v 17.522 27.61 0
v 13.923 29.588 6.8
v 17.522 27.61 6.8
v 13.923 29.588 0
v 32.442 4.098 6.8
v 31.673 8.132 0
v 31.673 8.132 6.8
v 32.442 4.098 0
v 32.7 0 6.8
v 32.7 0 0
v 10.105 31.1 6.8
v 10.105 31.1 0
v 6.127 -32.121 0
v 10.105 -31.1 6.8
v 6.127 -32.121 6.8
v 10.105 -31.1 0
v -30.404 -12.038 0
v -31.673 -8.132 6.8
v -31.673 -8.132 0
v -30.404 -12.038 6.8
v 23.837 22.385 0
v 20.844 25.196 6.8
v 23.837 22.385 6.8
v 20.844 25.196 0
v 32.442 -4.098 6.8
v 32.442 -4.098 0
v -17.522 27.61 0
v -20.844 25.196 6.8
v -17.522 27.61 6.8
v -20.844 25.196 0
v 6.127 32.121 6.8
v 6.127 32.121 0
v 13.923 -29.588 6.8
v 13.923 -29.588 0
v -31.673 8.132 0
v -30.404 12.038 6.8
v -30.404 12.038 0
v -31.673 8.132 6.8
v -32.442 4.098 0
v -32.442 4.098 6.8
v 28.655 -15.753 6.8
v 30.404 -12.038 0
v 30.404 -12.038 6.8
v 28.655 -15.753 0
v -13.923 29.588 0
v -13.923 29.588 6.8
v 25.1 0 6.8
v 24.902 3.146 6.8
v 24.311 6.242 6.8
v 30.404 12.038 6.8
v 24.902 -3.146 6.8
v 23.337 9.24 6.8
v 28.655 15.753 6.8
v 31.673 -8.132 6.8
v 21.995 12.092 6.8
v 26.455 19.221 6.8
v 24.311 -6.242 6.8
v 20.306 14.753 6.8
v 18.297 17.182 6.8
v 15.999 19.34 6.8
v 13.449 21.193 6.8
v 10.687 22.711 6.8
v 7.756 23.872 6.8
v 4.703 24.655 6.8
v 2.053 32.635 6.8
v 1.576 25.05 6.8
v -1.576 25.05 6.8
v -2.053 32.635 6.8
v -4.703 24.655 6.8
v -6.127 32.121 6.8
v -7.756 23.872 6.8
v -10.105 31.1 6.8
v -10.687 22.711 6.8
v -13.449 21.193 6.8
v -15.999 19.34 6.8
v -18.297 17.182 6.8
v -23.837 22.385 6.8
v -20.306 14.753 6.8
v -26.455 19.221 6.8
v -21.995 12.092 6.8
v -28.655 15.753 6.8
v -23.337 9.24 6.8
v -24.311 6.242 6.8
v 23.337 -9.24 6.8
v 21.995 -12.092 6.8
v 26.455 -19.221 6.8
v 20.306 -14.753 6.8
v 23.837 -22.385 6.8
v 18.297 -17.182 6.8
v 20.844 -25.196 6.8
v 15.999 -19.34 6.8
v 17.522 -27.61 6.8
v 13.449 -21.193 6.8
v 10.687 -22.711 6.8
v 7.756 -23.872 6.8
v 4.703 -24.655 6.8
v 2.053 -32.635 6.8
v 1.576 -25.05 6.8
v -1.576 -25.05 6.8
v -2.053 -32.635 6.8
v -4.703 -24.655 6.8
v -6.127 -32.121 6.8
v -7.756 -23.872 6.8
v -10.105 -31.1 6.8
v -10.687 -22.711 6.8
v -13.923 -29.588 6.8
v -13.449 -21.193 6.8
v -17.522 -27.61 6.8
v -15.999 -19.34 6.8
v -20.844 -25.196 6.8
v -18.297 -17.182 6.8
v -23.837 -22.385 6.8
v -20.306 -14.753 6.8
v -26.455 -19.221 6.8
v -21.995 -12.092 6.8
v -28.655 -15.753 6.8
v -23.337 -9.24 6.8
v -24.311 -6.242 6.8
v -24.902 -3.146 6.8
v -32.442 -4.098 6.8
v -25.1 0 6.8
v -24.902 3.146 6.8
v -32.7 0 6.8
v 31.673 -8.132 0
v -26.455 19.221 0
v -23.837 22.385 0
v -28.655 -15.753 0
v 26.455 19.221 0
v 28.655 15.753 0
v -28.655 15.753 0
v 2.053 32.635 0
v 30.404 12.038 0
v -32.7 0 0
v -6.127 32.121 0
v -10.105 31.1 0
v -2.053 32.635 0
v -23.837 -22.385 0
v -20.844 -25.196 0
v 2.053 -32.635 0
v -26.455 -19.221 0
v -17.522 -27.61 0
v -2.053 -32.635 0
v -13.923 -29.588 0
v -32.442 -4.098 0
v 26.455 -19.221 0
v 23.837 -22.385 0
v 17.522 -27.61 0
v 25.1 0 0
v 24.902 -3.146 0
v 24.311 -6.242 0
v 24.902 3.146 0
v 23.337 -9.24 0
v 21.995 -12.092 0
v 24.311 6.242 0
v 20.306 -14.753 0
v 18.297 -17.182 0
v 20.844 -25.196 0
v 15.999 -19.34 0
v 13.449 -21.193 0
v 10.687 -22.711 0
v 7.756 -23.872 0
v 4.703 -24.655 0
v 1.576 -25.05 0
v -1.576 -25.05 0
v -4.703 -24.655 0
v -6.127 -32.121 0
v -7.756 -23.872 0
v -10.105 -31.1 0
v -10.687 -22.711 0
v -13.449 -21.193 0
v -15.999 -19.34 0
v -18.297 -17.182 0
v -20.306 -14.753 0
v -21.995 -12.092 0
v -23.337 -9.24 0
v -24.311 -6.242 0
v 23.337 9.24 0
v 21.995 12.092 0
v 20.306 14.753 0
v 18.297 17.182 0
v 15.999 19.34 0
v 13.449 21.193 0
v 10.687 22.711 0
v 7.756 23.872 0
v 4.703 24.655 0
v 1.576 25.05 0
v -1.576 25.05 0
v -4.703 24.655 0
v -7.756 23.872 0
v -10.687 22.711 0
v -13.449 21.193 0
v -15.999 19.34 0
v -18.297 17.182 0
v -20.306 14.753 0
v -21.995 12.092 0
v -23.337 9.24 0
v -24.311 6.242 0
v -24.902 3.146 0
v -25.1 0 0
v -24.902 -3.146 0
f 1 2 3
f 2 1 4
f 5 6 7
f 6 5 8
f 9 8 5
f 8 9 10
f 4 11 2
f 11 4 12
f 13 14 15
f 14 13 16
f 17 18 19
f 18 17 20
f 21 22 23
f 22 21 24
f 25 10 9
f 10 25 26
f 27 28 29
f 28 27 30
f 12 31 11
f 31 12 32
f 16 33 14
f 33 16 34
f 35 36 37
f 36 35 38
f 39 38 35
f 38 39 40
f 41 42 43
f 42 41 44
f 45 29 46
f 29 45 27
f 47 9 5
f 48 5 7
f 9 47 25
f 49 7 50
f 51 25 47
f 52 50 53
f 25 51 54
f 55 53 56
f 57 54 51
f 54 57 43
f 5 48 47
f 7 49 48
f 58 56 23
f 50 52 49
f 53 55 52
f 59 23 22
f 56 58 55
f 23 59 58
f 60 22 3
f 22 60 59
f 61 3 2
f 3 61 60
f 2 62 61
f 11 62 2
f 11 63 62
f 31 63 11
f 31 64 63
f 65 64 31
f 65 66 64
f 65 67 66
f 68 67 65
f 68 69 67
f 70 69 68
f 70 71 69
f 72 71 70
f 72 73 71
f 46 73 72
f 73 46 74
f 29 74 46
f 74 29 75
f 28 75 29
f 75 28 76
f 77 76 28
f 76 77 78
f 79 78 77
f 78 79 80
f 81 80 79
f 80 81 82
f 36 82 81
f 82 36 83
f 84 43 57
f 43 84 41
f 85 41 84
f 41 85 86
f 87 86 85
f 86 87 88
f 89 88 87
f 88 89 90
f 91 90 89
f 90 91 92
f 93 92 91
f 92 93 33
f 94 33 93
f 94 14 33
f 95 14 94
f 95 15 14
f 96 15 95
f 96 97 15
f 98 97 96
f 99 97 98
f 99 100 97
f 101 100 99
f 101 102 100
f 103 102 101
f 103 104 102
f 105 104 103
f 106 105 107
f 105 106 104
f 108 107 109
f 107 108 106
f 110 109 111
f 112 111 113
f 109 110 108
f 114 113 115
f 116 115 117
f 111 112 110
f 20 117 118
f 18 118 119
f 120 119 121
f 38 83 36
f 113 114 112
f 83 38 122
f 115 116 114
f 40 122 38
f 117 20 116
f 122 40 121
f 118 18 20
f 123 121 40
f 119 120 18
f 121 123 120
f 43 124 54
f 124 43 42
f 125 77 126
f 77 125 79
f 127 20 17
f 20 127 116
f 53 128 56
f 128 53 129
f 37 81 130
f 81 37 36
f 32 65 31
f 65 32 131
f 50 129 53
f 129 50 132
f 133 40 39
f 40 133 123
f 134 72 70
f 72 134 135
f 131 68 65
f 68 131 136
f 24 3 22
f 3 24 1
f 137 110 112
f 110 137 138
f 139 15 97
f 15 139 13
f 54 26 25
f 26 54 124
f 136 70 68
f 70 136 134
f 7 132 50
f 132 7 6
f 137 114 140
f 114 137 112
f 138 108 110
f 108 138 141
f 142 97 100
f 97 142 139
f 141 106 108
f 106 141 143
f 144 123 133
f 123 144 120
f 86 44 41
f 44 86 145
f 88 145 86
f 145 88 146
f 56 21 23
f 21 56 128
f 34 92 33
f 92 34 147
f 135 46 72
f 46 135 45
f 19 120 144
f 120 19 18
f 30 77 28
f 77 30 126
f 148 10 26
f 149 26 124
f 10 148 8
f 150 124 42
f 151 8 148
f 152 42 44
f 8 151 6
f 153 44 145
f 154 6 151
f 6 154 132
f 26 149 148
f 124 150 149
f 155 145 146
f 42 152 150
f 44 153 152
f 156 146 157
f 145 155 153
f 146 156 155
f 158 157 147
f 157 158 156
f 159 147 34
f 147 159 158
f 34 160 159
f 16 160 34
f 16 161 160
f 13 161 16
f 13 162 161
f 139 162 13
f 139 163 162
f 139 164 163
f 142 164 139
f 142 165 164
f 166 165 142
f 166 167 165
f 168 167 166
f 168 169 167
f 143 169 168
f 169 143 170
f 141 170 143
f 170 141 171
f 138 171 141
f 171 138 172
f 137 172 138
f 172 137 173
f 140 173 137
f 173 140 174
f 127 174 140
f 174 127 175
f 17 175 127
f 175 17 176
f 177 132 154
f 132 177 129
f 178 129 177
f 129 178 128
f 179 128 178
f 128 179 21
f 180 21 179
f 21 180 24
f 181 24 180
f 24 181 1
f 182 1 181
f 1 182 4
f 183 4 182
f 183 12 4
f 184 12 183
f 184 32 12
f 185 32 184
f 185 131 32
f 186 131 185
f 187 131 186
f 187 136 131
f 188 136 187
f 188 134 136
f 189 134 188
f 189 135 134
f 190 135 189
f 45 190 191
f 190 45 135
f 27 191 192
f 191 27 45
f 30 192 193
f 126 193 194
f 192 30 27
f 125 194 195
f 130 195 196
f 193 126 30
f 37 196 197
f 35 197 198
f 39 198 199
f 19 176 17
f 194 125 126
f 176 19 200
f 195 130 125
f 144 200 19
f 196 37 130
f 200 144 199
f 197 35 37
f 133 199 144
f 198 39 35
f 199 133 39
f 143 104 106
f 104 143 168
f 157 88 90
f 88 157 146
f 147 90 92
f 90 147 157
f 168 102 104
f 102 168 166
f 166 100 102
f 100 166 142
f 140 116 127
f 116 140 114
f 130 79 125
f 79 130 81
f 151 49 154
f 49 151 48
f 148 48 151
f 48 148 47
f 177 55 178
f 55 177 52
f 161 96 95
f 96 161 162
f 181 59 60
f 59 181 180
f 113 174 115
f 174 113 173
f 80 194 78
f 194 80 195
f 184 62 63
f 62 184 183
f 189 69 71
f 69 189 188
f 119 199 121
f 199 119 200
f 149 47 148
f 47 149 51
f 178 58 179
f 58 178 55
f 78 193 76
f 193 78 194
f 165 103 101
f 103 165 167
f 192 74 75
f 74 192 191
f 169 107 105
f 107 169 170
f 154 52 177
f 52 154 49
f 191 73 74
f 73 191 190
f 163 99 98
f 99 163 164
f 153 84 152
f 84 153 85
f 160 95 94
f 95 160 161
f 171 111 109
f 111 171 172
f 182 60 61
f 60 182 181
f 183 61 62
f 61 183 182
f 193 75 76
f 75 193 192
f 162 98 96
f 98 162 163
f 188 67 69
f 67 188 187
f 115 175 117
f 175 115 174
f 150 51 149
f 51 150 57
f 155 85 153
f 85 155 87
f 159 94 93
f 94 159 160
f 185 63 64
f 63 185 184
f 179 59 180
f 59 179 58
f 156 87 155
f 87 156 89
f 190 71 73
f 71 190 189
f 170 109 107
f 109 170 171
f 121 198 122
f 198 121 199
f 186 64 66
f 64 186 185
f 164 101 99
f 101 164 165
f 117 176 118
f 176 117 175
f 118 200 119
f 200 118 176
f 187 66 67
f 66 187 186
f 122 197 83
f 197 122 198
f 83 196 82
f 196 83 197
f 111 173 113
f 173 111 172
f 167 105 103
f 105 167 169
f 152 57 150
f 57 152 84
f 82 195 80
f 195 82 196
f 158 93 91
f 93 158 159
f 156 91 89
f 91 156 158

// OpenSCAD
$fn = 50;


difference() {
	union() {
		cylinder(h = 6.8000000000, r = 32.7000000000);
	}
	union() {
		cylinder(h = 6.8000000000, r = 25.1000000000);
	}
}
